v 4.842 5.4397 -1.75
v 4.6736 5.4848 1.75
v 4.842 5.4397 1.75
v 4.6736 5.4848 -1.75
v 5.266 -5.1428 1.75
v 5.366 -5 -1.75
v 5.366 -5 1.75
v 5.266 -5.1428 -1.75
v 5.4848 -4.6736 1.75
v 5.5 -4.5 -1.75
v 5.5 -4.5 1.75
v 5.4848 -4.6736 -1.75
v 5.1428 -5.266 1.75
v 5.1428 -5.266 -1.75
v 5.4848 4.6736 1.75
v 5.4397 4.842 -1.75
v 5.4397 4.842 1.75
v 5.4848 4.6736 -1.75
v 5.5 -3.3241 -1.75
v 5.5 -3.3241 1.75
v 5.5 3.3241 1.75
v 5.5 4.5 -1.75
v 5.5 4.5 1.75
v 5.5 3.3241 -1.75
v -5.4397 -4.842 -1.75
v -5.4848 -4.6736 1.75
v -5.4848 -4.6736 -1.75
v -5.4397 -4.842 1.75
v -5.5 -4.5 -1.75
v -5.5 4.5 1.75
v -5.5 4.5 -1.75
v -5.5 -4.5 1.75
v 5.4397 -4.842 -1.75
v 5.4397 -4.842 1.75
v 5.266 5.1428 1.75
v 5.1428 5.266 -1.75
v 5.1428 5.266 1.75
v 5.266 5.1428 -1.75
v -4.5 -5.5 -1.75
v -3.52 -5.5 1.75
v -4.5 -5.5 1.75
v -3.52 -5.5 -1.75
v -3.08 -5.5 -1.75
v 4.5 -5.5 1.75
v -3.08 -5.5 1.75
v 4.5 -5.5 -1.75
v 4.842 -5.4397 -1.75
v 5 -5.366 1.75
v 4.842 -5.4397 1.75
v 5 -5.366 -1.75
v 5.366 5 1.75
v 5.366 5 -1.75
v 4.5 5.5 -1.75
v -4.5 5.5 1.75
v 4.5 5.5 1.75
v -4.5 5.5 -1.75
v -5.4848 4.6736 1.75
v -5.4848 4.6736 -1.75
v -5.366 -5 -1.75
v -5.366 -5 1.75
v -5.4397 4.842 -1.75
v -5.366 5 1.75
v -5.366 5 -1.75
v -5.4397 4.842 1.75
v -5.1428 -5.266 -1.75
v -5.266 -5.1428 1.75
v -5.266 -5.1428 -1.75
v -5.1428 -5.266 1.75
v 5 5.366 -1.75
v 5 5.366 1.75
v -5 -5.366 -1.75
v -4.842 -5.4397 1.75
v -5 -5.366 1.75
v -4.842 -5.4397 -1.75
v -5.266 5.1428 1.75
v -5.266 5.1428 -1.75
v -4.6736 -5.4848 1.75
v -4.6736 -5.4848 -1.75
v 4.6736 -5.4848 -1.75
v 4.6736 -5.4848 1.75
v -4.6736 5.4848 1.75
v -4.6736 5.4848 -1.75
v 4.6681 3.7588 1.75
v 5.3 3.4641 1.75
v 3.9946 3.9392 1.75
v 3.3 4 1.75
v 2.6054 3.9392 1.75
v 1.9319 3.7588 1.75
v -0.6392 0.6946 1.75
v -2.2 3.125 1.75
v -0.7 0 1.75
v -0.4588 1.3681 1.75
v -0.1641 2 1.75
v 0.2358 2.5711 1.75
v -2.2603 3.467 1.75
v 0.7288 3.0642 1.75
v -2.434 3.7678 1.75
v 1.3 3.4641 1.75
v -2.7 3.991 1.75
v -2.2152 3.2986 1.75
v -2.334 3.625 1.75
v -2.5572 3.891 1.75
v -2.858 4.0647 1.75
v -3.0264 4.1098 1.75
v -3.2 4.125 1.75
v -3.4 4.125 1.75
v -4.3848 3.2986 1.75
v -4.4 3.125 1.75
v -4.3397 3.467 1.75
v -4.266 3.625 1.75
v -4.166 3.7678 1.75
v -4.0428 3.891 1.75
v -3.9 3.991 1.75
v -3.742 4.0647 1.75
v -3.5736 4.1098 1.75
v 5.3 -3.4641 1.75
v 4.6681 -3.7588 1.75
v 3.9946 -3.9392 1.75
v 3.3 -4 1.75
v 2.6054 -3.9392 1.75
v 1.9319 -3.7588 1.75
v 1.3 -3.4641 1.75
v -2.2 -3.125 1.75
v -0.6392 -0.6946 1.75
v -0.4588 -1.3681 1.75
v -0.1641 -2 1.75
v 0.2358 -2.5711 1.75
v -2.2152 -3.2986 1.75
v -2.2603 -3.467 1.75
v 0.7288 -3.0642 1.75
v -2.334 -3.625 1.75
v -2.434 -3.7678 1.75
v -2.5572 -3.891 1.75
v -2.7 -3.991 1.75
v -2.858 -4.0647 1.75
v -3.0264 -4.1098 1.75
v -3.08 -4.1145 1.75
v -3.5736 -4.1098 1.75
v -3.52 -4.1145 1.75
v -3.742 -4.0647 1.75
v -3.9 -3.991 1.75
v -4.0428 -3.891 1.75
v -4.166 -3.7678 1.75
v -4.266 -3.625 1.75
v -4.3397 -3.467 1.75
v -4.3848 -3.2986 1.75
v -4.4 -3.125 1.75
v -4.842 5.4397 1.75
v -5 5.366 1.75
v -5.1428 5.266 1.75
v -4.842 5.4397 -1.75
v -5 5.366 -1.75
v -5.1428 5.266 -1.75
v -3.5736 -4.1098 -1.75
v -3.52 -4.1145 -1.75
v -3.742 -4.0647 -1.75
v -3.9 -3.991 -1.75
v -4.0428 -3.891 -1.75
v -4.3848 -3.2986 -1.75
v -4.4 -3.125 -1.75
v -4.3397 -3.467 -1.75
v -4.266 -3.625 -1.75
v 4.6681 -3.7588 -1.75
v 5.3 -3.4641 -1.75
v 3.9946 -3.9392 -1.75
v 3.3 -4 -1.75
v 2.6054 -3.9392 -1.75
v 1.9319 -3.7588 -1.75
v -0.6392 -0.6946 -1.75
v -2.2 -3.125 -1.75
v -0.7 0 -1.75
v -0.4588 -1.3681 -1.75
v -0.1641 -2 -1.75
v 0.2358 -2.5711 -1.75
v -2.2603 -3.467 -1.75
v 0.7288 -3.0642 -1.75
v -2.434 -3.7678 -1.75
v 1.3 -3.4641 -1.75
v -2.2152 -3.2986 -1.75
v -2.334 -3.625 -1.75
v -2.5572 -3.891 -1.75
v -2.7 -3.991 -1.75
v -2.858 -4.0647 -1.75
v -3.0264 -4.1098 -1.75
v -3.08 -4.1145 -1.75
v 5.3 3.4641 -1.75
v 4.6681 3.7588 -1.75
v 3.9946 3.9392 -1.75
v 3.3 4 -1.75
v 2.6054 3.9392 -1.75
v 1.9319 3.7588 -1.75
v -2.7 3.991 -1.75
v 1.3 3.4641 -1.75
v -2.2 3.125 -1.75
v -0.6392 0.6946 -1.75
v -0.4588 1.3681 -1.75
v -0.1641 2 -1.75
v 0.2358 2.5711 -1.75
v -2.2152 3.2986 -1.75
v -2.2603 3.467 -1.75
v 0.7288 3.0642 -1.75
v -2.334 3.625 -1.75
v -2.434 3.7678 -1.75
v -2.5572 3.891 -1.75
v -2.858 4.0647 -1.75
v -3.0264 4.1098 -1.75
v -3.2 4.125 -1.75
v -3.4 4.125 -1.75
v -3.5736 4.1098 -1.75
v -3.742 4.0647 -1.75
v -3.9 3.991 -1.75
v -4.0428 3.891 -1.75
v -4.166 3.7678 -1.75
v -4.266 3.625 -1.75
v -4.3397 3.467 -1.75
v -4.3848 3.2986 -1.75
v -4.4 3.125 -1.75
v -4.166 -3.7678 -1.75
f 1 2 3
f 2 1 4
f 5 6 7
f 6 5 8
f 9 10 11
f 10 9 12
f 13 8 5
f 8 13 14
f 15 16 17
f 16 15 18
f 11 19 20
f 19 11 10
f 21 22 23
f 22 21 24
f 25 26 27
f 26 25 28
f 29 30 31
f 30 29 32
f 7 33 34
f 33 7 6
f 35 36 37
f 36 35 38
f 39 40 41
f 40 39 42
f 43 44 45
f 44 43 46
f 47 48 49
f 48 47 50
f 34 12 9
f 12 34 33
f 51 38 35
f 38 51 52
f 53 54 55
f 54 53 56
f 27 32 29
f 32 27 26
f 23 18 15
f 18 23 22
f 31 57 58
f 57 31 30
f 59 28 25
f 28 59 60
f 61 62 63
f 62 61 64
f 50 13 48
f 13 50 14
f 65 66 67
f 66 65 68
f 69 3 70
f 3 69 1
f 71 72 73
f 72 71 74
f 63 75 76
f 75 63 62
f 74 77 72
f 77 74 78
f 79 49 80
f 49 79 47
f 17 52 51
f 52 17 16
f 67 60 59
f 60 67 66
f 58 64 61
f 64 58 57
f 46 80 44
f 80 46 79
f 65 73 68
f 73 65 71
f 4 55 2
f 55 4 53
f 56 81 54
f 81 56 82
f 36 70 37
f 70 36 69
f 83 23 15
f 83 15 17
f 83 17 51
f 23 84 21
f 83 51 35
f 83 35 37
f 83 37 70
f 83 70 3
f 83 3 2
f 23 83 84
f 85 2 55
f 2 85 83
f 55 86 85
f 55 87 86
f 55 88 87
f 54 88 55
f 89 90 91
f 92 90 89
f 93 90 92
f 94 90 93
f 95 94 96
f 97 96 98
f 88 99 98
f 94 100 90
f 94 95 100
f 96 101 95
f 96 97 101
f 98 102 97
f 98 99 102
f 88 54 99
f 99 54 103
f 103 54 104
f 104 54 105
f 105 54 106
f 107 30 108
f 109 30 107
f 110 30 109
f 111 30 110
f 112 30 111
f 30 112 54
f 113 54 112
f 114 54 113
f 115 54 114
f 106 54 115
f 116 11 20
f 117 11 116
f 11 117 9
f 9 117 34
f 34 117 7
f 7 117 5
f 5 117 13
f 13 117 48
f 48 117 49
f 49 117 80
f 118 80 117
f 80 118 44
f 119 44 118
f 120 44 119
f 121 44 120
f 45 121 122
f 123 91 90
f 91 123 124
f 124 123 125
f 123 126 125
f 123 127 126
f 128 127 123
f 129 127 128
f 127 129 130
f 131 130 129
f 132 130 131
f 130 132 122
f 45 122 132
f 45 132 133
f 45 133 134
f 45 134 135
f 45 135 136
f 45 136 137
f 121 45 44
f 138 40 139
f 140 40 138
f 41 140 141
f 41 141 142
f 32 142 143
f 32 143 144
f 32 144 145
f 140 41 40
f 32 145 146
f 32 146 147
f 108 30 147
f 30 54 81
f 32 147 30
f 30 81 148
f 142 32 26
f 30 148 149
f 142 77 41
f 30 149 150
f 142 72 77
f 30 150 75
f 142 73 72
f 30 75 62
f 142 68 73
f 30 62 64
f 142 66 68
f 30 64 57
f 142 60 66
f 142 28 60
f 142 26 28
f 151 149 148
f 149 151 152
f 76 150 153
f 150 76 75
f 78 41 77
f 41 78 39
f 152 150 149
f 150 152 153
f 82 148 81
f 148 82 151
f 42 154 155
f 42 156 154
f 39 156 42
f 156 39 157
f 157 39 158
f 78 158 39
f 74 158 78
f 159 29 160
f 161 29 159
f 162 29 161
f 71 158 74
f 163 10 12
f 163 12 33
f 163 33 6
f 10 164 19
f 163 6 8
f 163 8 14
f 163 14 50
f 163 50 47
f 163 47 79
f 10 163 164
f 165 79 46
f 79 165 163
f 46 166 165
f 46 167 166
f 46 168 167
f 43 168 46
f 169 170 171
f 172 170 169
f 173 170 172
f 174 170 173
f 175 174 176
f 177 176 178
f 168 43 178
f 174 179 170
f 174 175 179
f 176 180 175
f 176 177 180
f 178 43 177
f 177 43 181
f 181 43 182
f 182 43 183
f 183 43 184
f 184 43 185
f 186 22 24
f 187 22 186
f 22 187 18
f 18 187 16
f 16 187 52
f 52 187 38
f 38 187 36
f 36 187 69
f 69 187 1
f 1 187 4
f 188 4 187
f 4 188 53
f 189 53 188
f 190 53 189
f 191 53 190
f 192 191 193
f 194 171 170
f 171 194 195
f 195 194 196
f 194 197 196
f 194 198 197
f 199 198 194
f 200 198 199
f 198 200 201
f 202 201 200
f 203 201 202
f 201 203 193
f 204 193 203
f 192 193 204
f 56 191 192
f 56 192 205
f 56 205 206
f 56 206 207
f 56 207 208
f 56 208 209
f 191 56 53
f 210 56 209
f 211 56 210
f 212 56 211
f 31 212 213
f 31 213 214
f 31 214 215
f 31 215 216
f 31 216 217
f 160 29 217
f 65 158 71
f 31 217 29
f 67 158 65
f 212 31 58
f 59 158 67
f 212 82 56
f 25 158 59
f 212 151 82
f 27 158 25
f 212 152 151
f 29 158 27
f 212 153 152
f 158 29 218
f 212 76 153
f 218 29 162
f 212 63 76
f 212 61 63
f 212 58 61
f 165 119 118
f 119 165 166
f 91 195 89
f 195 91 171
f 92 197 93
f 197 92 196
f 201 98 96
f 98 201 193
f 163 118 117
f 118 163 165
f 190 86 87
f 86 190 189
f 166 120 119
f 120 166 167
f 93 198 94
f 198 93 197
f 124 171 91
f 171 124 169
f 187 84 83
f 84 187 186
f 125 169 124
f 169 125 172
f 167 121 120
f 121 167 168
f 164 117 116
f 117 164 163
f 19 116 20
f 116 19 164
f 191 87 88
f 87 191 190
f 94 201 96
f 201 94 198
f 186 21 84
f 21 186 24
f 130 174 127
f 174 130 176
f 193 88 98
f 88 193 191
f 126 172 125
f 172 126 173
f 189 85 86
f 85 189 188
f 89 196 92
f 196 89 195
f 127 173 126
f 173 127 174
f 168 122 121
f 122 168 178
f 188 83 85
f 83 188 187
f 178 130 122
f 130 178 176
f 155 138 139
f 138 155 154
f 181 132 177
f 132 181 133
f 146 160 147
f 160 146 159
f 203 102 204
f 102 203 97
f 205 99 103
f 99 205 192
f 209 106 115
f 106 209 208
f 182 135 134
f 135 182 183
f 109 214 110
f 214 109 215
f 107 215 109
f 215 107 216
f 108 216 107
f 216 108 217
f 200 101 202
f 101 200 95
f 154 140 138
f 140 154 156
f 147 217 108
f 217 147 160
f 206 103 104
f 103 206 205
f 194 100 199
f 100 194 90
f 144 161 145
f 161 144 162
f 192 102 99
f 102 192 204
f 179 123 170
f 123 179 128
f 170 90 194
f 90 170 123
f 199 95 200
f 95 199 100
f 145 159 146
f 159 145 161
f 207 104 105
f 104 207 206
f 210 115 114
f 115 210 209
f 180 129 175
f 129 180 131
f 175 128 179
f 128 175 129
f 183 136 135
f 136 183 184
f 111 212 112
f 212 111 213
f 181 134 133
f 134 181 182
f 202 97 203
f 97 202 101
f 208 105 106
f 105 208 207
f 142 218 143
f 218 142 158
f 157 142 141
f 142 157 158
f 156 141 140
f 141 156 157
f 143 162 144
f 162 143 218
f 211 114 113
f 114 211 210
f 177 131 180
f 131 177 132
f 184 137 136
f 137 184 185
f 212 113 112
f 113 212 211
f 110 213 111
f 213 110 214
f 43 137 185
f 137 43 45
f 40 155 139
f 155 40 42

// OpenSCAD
// file: rounded_cube.scad
module rounded_cube(size = [ 1, 1, 1 ], center = false, r = 0.5) {
	// if single value, convert to [x, y, z] vector
	size = (size[0] == undef) ? [size, size, size] : size;

	translate = (center == false) ?
		[ r, r, r ] :
		[
			r - (size[0] / 2),
			r - (size[1] / 2),
			r - (size[2] / 2)
        ];

	translate(translate)
	minkowski() {
		cube(size = [
			size[0] - (r * 2),
			size[1] - (r * 2),
			size[2] - (r * 2)
		]);
		sphere(r);
	}
}


module rounded_column(size = [1, 1, 1], center = false, r = 0.5) {
	// if single value, convert to [x, y, z] vector
	size = (size[0] == undef) ? [size, size, size] : size;

    x = size[0] - 2*r;
    y = size[1] - 2*r;
    h = size[2];
    
	translate = (center == false) ?
		[ r, r, 0 ] :
		[
			r - (size[0] / 2),
			r - (size[1] / 2),
			  - h / 2
        ];

	translate(translate)
    hull() {
		translate([ 0, 0, 0 ]) cylinder(r=r, h);
		translate([ x, 0, 0 ]) cylinder(r=r, h);
		translate([ 0, y, 0 ]) cylinder(r=r, h);
		translate([ x, y, 0 ]) cylinder(r=r, h);
	}
}

rounded_cube(20, r=4, center=true);
// main file
use <rounded_cube.scad>

$fn = 36;

rRail = 4;       // diam 8mm
rCorner = 1;
hClip = 3.5;
wClip = 11;


difference() {
    rounded_column([ wClip, wClip, hClip ], r=rCorner, center=true);
    
    translate([ 0.3*wClip, 0, 0] )
    cylinder(r=rRail, h=hClip*3, center=true);

    translate([ -0.3*wClip, 0.0*wClip, 0] )
    rounded_column([ 0.2*wClip, 0.75*wClip, hClip*3 ], r=rCorner, center=true);
    
    translate([ -0.3*wClip, -0.5*wClip, 0] )
    cube([ 0.04*wClip, 0.8*wClip, hClip*3 ], center=true);
    
}
